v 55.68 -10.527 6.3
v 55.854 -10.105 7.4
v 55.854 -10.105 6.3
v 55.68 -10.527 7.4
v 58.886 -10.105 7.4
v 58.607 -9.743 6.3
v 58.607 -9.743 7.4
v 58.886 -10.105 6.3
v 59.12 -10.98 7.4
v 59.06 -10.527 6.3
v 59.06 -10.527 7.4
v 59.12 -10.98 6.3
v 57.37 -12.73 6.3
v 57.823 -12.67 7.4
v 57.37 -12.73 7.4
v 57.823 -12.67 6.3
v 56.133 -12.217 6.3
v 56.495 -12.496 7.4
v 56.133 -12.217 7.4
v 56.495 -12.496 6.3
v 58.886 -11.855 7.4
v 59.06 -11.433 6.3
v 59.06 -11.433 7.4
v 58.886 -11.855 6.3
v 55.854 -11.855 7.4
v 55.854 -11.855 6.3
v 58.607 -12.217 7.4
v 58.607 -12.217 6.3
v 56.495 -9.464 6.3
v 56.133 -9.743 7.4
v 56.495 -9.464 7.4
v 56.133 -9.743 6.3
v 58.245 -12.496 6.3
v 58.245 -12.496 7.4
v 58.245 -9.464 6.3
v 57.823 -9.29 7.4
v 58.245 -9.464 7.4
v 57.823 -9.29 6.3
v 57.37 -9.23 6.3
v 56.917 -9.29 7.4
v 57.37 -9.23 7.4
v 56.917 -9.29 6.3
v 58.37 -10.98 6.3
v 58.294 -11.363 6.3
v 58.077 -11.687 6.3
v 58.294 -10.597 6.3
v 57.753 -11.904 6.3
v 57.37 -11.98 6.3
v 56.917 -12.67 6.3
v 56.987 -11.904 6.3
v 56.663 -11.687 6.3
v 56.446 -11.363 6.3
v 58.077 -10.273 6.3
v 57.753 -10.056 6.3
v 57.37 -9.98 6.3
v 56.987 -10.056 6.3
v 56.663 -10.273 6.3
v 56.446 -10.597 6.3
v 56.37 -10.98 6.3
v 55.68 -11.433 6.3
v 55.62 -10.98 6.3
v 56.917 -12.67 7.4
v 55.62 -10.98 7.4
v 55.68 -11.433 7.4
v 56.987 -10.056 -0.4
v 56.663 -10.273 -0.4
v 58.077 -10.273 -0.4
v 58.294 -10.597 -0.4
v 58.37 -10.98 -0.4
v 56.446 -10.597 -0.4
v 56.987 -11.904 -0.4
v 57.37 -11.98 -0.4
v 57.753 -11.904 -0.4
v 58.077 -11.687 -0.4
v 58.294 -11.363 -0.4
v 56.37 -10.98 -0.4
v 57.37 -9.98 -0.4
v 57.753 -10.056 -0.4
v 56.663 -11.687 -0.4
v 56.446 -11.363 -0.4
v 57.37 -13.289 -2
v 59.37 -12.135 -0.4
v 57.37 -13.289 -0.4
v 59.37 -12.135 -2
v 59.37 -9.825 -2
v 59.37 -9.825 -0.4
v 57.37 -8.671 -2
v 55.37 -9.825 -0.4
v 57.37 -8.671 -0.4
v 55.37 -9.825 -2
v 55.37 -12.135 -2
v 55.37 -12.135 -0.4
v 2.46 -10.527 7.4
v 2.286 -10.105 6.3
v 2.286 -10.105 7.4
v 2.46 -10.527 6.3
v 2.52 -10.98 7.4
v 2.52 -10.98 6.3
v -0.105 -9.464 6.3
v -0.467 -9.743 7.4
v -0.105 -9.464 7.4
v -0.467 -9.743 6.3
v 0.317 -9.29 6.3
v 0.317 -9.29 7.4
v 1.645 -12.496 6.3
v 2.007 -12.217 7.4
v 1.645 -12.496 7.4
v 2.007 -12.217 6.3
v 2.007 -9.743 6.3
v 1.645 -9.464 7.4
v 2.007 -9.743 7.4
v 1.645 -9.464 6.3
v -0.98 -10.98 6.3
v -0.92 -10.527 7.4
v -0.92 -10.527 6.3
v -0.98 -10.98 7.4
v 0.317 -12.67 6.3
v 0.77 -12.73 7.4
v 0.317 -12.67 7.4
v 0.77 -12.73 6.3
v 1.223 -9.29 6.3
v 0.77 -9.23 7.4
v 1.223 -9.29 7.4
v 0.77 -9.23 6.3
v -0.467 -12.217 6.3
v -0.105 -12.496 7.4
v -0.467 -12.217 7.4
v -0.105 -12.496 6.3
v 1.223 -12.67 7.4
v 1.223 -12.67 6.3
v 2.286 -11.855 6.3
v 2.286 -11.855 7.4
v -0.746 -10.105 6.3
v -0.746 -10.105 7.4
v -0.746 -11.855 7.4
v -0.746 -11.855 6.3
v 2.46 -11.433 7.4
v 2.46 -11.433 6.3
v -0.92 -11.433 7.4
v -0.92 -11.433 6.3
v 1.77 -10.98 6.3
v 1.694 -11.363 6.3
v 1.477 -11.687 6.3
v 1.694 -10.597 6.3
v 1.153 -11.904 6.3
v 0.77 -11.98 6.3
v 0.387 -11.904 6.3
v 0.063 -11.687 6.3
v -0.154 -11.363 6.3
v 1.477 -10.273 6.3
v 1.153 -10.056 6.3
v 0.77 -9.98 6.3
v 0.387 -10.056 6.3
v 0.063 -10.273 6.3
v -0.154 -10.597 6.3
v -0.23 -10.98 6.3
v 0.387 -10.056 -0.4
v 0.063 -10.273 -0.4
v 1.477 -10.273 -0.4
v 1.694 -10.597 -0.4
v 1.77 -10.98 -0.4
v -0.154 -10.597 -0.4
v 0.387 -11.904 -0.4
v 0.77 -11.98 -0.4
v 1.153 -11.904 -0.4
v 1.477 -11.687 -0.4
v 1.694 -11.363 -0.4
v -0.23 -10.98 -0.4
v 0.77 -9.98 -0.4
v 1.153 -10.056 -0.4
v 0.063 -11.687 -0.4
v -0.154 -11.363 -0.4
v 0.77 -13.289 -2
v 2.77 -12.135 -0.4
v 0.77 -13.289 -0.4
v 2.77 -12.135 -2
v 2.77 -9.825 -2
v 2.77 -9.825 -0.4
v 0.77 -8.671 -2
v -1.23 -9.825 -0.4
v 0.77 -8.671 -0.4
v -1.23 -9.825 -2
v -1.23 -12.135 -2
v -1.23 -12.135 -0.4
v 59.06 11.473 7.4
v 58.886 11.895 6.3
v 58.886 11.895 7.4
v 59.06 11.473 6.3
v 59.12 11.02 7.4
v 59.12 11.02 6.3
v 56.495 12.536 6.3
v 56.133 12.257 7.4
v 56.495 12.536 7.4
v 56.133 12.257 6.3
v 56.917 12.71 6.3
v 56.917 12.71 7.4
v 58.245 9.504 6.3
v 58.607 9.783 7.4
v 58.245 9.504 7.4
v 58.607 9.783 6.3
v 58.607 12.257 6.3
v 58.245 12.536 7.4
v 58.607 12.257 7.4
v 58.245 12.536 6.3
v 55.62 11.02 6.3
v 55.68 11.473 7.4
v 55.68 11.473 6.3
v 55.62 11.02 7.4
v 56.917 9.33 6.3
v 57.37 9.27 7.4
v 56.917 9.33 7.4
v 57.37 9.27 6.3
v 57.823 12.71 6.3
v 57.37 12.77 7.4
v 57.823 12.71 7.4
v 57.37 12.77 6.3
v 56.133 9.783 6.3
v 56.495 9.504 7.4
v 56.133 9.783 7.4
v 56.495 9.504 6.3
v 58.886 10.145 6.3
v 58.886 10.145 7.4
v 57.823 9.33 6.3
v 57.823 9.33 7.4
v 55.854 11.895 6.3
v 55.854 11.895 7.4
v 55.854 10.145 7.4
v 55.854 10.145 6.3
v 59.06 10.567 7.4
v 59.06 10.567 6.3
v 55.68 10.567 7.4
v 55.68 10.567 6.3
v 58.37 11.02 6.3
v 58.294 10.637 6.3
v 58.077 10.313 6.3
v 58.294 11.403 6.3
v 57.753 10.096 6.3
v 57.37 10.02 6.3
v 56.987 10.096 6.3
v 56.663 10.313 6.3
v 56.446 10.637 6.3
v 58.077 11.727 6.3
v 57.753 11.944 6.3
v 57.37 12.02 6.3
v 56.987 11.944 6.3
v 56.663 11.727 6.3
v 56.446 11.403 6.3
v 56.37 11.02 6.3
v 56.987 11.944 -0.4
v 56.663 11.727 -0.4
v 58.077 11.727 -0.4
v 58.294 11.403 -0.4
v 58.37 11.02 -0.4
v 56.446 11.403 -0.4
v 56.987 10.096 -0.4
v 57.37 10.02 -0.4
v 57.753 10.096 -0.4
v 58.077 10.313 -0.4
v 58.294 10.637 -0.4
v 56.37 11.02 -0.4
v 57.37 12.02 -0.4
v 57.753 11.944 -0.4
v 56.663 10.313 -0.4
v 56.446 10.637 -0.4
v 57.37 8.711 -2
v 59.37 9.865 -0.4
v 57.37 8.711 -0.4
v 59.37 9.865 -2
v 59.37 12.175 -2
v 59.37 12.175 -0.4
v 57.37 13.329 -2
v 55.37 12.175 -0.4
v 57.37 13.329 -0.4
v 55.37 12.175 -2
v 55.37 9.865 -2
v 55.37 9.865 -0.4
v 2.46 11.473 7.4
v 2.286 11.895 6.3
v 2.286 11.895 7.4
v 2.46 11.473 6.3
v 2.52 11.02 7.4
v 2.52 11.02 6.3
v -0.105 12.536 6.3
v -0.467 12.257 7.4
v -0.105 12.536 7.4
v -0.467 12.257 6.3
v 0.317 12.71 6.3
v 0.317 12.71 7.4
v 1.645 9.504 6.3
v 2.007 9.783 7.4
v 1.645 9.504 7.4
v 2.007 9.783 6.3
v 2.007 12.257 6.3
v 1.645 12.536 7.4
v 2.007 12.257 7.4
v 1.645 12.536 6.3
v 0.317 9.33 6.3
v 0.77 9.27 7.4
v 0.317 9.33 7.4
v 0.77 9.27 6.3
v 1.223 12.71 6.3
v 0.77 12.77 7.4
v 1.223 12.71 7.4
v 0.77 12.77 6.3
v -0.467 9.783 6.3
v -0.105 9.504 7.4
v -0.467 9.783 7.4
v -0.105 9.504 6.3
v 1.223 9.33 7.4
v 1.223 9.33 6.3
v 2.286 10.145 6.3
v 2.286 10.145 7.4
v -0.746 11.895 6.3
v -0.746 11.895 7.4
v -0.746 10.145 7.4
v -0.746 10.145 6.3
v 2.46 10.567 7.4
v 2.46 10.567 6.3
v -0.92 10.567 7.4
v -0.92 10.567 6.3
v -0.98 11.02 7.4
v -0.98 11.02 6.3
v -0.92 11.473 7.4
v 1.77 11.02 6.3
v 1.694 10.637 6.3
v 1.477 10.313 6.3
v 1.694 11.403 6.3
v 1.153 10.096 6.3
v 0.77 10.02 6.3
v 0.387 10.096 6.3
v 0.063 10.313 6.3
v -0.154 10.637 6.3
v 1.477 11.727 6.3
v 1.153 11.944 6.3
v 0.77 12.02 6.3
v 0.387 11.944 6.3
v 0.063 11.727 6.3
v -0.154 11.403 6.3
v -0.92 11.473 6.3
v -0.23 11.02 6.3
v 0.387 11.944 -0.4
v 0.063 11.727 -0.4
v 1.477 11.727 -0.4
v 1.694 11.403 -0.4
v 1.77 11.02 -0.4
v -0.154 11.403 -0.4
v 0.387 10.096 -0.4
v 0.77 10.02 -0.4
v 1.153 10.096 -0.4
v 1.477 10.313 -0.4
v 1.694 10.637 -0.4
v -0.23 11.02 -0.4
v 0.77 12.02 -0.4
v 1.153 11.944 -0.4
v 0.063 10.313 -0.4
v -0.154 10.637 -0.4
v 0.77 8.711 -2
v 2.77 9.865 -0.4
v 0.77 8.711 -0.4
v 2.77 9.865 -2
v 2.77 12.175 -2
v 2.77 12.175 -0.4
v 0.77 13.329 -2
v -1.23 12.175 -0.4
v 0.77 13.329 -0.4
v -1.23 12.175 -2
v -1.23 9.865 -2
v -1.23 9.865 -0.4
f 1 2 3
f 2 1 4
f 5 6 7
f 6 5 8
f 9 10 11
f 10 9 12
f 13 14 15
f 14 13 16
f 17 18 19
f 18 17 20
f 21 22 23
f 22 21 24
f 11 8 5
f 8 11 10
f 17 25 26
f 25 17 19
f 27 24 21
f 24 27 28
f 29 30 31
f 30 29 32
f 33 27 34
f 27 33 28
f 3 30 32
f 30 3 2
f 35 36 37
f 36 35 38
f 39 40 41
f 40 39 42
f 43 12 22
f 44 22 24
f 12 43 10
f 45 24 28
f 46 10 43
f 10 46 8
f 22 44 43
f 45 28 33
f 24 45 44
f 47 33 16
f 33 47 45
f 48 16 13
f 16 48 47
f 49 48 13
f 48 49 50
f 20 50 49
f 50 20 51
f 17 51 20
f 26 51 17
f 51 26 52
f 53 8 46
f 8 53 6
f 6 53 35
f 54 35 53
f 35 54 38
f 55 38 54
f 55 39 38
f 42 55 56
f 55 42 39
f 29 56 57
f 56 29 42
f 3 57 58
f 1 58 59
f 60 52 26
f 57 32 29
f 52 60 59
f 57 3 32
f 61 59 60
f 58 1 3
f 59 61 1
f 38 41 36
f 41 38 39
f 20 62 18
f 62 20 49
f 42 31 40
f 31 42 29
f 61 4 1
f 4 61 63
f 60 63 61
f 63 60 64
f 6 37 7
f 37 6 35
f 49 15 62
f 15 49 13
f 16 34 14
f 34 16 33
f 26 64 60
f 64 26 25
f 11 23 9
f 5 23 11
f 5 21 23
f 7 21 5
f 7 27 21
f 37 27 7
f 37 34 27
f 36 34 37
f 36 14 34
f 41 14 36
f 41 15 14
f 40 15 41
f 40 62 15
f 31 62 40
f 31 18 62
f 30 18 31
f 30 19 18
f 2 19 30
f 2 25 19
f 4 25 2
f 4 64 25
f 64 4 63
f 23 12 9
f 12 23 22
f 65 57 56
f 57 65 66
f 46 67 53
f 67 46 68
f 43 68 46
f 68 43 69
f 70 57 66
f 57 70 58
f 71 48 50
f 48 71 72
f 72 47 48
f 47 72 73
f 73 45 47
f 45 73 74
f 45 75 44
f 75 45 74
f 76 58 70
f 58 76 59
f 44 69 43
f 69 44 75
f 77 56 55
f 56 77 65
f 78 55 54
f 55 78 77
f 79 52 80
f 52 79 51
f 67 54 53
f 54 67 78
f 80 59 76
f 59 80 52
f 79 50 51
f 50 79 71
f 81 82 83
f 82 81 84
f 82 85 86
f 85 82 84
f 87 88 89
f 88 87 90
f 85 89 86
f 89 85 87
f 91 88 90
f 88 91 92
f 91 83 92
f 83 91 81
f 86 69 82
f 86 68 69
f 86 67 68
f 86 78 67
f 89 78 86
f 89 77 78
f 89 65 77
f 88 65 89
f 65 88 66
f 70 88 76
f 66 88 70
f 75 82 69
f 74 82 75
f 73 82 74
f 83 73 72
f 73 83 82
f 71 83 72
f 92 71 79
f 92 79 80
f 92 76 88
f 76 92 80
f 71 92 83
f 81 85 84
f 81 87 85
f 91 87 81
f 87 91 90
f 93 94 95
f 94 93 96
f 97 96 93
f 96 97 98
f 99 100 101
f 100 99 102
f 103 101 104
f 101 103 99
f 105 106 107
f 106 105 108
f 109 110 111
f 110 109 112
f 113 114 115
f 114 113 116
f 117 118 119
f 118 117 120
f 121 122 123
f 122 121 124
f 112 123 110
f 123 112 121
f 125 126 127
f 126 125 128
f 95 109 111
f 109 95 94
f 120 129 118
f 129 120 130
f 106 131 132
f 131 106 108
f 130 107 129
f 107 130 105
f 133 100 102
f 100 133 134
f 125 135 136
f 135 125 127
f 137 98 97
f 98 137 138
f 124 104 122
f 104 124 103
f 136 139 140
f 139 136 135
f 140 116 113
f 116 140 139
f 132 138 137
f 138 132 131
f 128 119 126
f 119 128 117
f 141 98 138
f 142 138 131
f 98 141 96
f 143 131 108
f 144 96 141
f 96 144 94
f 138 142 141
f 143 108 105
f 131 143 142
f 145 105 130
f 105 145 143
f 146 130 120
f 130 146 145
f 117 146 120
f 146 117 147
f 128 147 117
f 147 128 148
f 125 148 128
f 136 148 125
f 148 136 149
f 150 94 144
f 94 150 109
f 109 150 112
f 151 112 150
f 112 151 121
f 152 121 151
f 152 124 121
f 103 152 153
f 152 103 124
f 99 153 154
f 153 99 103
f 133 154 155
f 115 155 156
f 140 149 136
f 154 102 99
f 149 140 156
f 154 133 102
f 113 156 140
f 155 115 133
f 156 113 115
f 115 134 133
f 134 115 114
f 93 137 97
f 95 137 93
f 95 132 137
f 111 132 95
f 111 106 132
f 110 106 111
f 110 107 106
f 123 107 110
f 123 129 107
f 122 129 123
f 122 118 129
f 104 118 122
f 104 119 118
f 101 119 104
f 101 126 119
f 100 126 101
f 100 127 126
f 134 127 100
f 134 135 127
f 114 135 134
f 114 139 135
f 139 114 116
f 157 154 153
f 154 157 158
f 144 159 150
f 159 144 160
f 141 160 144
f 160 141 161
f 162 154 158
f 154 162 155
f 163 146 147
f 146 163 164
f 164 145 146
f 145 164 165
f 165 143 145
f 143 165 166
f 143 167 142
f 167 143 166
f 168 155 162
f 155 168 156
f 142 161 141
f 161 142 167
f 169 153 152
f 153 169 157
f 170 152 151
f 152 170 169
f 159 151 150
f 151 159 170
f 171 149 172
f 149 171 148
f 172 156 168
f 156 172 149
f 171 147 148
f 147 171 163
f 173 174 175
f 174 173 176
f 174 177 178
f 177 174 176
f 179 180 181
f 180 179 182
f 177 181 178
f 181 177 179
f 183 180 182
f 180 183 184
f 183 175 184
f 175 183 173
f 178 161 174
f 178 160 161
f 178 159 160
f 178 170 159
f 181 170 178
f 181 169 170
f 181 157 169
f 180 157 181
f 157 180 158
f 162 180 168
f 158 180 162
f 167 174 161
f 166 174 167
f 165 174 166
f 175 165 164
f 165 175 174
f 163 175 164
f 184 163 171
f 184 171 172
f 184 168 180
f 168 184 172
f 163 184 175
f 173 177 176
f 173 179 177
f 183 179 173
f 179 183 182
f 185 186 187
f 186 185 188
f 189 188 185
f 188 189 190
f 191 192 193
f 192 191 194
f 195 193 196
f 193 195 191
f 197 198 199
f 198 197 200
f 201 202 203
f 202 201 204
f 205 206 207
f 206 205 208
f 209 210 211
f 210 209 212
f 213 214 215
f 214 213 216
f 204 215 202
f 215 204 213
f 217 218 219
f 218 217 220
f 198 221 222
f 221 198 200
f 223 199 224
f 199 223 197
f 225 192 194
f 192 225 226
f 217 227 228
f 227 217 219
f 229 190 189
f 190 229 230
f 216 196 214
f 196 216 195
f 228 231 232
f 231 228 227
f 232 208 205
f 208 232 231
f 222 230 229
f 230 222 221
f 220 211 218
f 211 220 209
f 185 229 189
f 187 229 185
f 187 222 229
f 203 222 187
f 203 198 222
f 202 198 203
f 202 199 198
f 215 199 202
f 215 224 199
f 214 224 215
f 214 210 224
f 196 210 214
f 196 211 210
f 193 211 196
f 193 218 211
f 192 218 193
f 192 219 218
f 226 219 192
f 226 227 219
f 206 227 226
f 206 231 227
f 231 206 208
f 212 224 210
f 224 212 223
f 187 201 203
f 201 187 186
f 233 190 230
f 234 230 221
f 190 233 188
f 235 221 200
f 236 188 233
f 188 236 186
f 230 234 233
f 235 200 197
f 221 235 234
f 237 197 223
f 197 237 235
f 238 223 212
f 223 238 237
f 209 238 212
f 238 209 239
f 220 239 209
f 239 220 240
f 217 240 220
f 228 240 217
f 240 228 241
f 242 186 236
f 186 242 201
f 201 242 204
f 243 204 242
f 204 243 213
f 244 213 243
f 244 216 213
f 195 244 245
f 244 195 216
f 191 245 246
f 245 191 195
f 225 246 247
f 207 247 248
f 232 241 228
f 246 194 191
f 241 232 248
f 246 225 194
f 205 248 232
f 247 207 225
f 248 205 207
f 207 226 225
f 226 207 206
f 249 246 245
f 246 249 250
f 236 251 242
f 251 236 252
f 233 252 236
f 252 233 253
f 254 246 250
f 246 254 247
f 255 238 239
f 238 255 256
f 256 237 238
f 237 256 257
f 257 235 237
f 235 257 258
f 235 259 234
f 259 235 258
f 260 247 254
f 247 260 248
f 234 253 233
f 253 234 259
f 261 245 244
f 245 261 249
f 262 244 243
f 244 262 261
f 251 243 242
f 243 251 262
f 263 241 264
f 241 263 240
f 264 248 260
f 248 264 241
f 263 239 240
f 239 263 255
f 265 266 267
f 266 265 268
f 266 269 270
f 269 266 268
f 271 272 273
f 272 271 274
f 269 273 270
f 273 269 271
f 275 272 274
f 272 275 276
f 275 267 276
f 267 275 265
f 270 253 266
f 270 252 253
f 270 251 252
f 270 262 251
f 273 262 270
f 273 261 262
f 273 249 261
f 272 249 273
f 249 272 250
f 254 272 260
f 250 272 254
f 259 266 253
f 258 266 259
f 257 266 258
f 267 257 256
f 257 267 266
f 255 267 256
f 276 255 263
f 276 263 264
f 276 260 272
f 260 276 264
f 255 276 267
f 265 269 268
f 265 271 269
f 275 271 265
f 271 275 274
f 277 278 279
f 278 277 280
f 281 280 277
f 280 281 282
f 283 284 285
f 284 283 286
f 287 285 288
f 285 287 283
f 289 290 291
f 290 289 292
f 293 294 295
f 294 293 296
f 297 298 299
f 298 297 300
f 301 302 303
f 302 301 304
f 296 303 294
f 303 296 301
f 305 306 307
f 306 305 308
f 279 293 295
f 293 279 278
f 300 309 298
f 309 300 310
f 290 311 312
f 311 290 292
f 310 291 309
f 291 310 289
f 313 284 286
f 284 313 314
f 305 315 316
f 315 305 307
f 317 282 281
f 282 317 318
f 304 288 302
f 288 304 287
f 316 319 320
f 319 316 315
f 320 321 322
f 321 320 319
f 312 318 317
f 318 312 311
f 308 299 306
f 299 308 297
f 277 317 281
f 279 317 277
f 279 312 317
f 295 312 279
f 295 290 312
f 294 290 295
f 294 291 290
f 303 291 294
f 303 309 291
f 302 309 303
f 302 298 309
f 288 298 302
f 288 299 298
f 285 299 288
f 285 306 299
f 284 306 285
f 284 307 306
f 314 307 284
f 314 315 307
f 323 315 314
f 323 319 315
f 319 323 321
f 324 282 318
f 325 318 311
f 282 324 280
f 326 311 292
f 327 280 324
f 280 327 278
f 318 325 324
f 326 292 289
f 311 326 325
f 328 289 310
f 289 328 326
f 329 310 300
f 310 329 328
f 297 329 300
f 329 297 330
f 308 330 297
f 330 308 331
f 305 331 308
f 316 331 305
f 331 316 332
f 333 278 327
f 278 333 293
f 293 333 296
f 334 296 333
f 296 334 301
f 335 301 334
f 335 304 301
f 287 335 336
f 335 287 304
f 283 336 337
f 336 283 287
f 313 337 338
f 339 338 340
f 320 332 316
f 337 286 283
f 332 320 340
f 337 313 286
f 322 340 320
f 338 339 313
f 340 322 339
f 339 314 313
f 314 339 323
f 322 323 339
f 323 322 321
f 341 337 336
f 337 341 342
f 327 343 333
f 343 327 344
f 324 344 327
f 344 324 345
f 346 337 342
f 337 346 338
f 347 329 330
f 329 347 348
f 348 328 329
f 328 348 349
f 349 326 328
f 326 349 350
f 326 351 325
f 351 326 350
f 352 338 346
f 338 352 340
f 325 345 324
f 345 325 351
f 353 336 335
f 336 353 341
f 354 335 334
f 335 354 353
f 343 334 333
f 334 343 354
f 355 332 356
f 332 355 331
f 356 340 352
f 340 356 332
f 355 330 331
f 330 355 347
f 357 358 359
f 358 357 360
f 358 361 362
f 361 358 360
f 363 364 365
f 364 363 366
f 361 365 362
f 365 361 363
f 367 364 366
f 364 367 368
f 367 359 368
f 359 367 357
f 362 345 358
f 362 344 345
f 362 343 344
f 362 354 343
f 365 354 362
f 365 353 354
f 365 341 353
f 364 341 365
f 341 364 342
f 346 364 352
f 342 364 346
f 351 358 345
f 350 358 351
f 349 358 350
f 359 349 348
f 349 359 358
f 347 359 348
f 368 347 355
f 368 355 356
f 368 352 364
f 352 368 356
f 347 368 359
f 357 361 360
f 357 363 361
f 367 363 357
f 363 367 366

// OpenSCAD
// file: ../../usb-c-port/usb-c-port.scad
//-----------------------------------------------------------------------
// USB-C port through a wall, flush: the socket's metal shell sits in a
// close-fitting pocket in the wall, walled in on all four sides, its face
// level with the outside. The cable seats the way it does on a laptop.
//
// A board's socket only overhangs the board edge by a mm or so, less than
// the wall. So the board's end tucks into a shallow relief in the wall's
// inner face, the width of the board, leaving the wall round the socket
// thin enough for the face to reach the outside. When that would leave less
// than usbcMinWall (a socket that barely overhangs), the face sits back from
// the outside instead: usbcRecess() says how far.
//
// Modules, all in the same frame:
//   usbcGhost()     the socket and the board's end, for previews
//   usbcWallCut()   subtract from the wall: socket pocket and board relief
//
// Frame: origin on the floor top at the wall's inner face, under the socket's
// axis. +X into the box, Z up. The wall is X = -wall .. 0. The board is
// component side up, socket on top (top-mount, as on the FireBeetle, C3 Super
// Mini and S3 DevKitC). Units: mm.
//
// usbcBoardEdgeX() gives where the board's edge lands (negative: inside the
// wall), so a holder can put its posts or pocket to match.
//-----------------------------------------------------------------------

//-- The socket: USB-C receptacle shell (USB-IF 8.34 x 2.56 plug, receptacle shell ~8.94 x 3.26)
usbcShellW     = 8.94;
usbcShellH     = 3.26;    // CAL per board: measured 3.2 on the FireBeetle
usbcShellR     = 1.2;     // CAL: end radius. Full round would be 1.63; most shells are squarer
usbcShellDepth = 7.35;    // face to back

//-- The pocket
usbcClearance  = 0.15;    // CAL: per side, shell to pocket. Set by the fit piece
usbcMinWall    = 1.0;     // thinnest wall left round the socket
usbcReliefGap  = 0.3;     // board relief over the board, each side and above/below
usbcChamfer    = 0.3;     // lead-in on the outside edge

//-- How far the socket face sits back from the outside: 0 (flush) unless the socket
//-- overhangs the board edge by less than usbcMinWall
function usbcRecess(overhang, minWall = usbcMinWall) = max(0, minWall - overhang);
//-- X of the board's socket edge in this frame
function usbcBoardEdgeX(wall, overhang, recess) =
  -wall + (is_undef(recess) ? usbcRecess(overhang) : recess) + overhang;
//-- Z of the board's underside above the floor top
function usbcBoardZ(axisZ, pcb, shellH = usbcShellH) = axisZ - shellH/2 - pcb;

module usbcShell2D(grow = 0, w = usbcShellW, h = usbcShellH, r = usbcShellR)
{
  offset(r = r + grow, $fn = 24) square([w - 2*r, h - 2*r], center = true);
}

//-- axisZ: socket axis above the floor. boardW/pcb: the board, for the ghost and relief.
//-- shift: socket centre across the board's width from the board's centre line (+Y)
module usbcGhost(axisZ, wall, overhang, boardW, pcb = 1.6, recess, shift = 0, shellH = usbcShellH, shellW = usbcShellW)
{
  ex = usbcBoardEdgeX(wall, overhang, recess);
  %color("Silver") translate([ex - overhang, 0, axisZ]) rotate([0, 90, 0]) rotate([0, 0, 90])
    linear_extrude(usbcShellDepth) usbcShell2D(w = shellW, h = shellH);
  %color("DarkSlateGray") translate([ex, -boardW/2 - shift, usbcBoardZ(axisZ, pcb, shellH)]) cube([12, boardW, pcb]);
}

module usbcWallCut(axisZ, wall, overhang, boardW, pcb = 1.6, recess, shift = 0,
                   clearance = usbcClearance, shellH = usbcShellH, shellW = usbcShellW, aboveBoard)
{
  rc = is_undef(recess) ? usbcRecess(overhang) : recess;
  ex = usbcBoardEdgeX(wall, overhang, rc);
  bz = usbcBoardZ(axisZ, pcb, shellH);
  //-- what stands on the board near its edge: the socket, unless told taller
  up = is_undef(aboveBoard) ? shellH : aboveBoard;
  assert(ex - overhang + wall >= -0.01, "socket face would stand proud of the wall");
  assert(rc > 0 || overhang >= usbcMinWall - 0.01, "wall round the socket under usbcMinWall");
  //-- socket pocket, through the wall
  translate([-wall - 1, 0, axisZ]) rotate([0, 90, 0]) rotate([0, 0, 90])
    linear_extrude(wall + 2) usbcShell2D(clearance, w = shellW, h = shellH);
  //-- lead-in chamfer on the outside
  translate([-wall, 0, axisZ]) rotate([0, 90, 0]) rotate([0, 0, 90])
    hull()
    {
      translate([0, 0, -0.01]) linear_extrude(0.01) usbcShell2D(clearance + usbcChamfer, w = shellW, h = shellH);
      translate([0, 0, usbcChamfer]) linear_extrude(0.01) usbcShell2D(clearance, w = shellW, h = shellH);
    }
  //-- board relief in the inner face, when the board's edge lands inside the wall
  if (ex < 0)
    translate([ex - usbcReliefGap, -boardW/2 - shift - usbcReliefGap, bz - usbcReliefGap])
      cube([-ex + usbcReliefGap + 1, boardW + 2*usbcReliefGap, pcb + up + 2*usbcReliefGap]);
}
// file: ../../screw-post/screw-post.scad
//-----------------------------------------------------------------------
// Screw post: a round post off the floor that a board screws down onto
//
// Two ways to fix:
//   "nut"  clearance hole through the post and floor; the nut sits in a hex
//          trap in the floor's underside, so the screw goes in from the top
//   "tap"  a pilot hole the screw cuts its own thread in (one or two fittings
//          in PLA/PETG); blind, the floor stays whole underneath
// and "head" for a screw up from below (head in a counterbore, nut on top).
//
// Modules, all in the same frame:
//   screwPostGhost()     the screw (and nut), for previews
//   screwPost()          the post: add to the floor
//   screwPostFloorCut()  subtract from the floor: nut trap / counterbore and hole
//
// Frame: origin on the floor top, on the post's axis. Z up; the floor is
// Z = -floorThick .. 0. Units: mm.
//
// Sizes: "M2", "M2.5", "M3". screwPostScrew(size, ...) says which screw length
// reaches, so a project can assert it has that screw in the kit.
//-----------------------------------------------------------------------

//-- [name, screw Ø, nut across flats, nut thick, head Ø, head height, tap hole, post Ø]
//-- Nuts ISO 4032; heads ISO 7380 button. Tap holes: the usual ~0.8 x Ø for plastic
screwSizes = [
  ["M2",   2.0, 4.0, 1.6, 3.5, 1.1, 1.6, 5.0],
  ["M2.5", 2.5, 5.0, 2.0, 4.4, 1.4, 2.1, 6.0],    // head 4.4: measured on the kit's M2.5 (controller base)
  ["M3",   3.0, 5.5, 2.4, 5.7, 1.65, 2.5, 7.0],
];

screwHoleClear = 0.4;     // added to the screw Ø for a clearance hole
screwNutClear  = 0.3;     // CAL: across flats, nut trap over the nut. Set by the fit piece
screwTapClear  = 0.0;     // CAL: added to the tap hole. Set by the fit piece
screwHeadClear = 0.6;     // counterbore over the head Ø

function screwSize(size) = let (i = search([size], screwSizes)[0])
  assert(i != [] && i != undef, str("unknown screw size ", size)) screwSizes[i];
function screwDia(size)    = screwSize(size)[1];
function screwNutAF(size)  = screwSize(size)[2];
function screwNutH(size)   = screwSize(size)[3];
function screwHeadDia(size)= screwSize(size)[4];
function screwHeadH(size)  = screwSize(size)[5];
function screwPostDia(size)= screwSize(size)[7];

//-- Shortest screw that fills the nut, from the top of the clamped part (h + clamp
//-- above the floor) down to the nut trap's underside. Round up to a length you have.
function screwPostScrew(size, h, floorThick, clamp = 1.6) = h + clamp + floorThick;

module screwPostGhost(size, h, floorThick, clamp = 1.6, length, how = "nut")
{
  d = screwDia(size);
  L = is_undef(length) ? screwPostScrew(size, h, floorThick, clamp) : length;
  top = h + clamp;
  if (how == "head")
  {
    %color("Silver") translate([0, 0, -floorThick]) cylinder(d = screwHeadDia(size), h = screwHeadH(size), $fn = 24);
    %color("Silver") translate([0, 0, -floorThick + screwHeadH(size)]) cylinder(d = d, h = L, $fn = 16);
  }
  else
  {
    %color("Silver") translate([0, 0, top]) cylinder(d = screwHeadDia(size), h = screwHeadH(size), $fn = 24);
    %color("Silver") translate([0, 0, top - L]) cylinder(d = d, h = L, $fn = 16);
    if (how == "nut")
      %color("DimGray") translate([0, 0, -floorThick]) rotate([0, 0, 30]) cylinder(d = screwNutAF(size)/cos(30), h = screwNutH(size), $fn = 6);
  }
}

//-- how: "nut" | "head" (through hole) or "tap" (blind pilot hole). postDia defaults by size
module screwPost(size, h, how = "nut", postDia, tapClear = screwTapClear)
{
  pd = is_undef(postDia) ? screwPostDia(size) : postDia;
  hole = how == "tap" ? screwSize(size)[6] + tapClear : screwDia(size) + screwHoleClear;
  difference()
  {
    translate([0, 0, -0.01]) cylinder(d = pd, h = h + 0.01, $fn = 40);
    translate([0, 0, how == "tap" ? 0.6 : -1]) cylinder(d = hole, h = h + 2, $fn = 24);
    //-- lead-in so the screw starts square
    translate([0, 0, h - 0.4]) cylinder(d1 = hole, d2 = hole + 0.8, h = 0.41, $fn = 24);
  }
}

//-- "nut": hex trap from the underside, opening a little over the nut so it sits flush.
//-- "head": counterbore for the head. "tap": nothing.
module screwPostFloorCut(size, floorThick, how = "nut", nutClear = screwNutClear)
{
  d = screwDia(size) + screwHoleClear;
  if (how == "nut")
  {
    af = screwNutAF(size) + nutClear;
    translate([0, 0, -floorThick - 1]) rotate([0, 0, 30]) cylinder(d = af/cos(30), h = screwNutH(size) + 0.1 + 1, $fn = 6);
    translate([0, 0, -floorThick - 1]) cylinder(d = d + 0.4, h = floorThick + 2, $fn = 24);
  }
  if (how == "head")
  {
    translate([0, 0, -floorThick - 1]) cylinder(d = screwHeadDia(size) + screwHeadClear, h = screwHeadH(size) + 0.2 + 1, $fn = 32);
    translate([0, 0, -floorThick - 1]) cylinder(d = d + 0.4, h = floorThick + 2, $fn = 24);
  }
  assert(how == "tap" || floorThick >= (how == "nut" ? screwNutH(size) : screwHeadH(size)) + 0.1 + 0.3,
         str("floor too thin for the ", size, " ", how));
}
// main file
// The M2 x 8 button-head screws and the nuts trapped in the floor, as solids for the catalogue.
use <../firebeetle-esp32e.scad>
use <../../screw-post/screw-post.scad>

variant    = "ESP32-E";
wall       = 2.4;
floorThick = 2.0;
postH      = 4.7;
length     = 8;

s   = "M2";
top = postH + 1.6;
for (h = fbHoles(variant, wall))
  translate([h[0], h[1], 0])
  {
    translate([0, 0, top]) cylinder(d = screwHeadDia(s), h = screwHeadH(s), $fn = 24);
    translate([0, 0, top - length]) cylinder(d = screwDia(s), h = length + 0.01, $fn = 16);
    translate([0, 0, -floorThick]) rotate([0, 0, 30]) cylinder(d = screwNutAF(s)/cos(30), h = screwNutH(s), $fn = 6);
  }
